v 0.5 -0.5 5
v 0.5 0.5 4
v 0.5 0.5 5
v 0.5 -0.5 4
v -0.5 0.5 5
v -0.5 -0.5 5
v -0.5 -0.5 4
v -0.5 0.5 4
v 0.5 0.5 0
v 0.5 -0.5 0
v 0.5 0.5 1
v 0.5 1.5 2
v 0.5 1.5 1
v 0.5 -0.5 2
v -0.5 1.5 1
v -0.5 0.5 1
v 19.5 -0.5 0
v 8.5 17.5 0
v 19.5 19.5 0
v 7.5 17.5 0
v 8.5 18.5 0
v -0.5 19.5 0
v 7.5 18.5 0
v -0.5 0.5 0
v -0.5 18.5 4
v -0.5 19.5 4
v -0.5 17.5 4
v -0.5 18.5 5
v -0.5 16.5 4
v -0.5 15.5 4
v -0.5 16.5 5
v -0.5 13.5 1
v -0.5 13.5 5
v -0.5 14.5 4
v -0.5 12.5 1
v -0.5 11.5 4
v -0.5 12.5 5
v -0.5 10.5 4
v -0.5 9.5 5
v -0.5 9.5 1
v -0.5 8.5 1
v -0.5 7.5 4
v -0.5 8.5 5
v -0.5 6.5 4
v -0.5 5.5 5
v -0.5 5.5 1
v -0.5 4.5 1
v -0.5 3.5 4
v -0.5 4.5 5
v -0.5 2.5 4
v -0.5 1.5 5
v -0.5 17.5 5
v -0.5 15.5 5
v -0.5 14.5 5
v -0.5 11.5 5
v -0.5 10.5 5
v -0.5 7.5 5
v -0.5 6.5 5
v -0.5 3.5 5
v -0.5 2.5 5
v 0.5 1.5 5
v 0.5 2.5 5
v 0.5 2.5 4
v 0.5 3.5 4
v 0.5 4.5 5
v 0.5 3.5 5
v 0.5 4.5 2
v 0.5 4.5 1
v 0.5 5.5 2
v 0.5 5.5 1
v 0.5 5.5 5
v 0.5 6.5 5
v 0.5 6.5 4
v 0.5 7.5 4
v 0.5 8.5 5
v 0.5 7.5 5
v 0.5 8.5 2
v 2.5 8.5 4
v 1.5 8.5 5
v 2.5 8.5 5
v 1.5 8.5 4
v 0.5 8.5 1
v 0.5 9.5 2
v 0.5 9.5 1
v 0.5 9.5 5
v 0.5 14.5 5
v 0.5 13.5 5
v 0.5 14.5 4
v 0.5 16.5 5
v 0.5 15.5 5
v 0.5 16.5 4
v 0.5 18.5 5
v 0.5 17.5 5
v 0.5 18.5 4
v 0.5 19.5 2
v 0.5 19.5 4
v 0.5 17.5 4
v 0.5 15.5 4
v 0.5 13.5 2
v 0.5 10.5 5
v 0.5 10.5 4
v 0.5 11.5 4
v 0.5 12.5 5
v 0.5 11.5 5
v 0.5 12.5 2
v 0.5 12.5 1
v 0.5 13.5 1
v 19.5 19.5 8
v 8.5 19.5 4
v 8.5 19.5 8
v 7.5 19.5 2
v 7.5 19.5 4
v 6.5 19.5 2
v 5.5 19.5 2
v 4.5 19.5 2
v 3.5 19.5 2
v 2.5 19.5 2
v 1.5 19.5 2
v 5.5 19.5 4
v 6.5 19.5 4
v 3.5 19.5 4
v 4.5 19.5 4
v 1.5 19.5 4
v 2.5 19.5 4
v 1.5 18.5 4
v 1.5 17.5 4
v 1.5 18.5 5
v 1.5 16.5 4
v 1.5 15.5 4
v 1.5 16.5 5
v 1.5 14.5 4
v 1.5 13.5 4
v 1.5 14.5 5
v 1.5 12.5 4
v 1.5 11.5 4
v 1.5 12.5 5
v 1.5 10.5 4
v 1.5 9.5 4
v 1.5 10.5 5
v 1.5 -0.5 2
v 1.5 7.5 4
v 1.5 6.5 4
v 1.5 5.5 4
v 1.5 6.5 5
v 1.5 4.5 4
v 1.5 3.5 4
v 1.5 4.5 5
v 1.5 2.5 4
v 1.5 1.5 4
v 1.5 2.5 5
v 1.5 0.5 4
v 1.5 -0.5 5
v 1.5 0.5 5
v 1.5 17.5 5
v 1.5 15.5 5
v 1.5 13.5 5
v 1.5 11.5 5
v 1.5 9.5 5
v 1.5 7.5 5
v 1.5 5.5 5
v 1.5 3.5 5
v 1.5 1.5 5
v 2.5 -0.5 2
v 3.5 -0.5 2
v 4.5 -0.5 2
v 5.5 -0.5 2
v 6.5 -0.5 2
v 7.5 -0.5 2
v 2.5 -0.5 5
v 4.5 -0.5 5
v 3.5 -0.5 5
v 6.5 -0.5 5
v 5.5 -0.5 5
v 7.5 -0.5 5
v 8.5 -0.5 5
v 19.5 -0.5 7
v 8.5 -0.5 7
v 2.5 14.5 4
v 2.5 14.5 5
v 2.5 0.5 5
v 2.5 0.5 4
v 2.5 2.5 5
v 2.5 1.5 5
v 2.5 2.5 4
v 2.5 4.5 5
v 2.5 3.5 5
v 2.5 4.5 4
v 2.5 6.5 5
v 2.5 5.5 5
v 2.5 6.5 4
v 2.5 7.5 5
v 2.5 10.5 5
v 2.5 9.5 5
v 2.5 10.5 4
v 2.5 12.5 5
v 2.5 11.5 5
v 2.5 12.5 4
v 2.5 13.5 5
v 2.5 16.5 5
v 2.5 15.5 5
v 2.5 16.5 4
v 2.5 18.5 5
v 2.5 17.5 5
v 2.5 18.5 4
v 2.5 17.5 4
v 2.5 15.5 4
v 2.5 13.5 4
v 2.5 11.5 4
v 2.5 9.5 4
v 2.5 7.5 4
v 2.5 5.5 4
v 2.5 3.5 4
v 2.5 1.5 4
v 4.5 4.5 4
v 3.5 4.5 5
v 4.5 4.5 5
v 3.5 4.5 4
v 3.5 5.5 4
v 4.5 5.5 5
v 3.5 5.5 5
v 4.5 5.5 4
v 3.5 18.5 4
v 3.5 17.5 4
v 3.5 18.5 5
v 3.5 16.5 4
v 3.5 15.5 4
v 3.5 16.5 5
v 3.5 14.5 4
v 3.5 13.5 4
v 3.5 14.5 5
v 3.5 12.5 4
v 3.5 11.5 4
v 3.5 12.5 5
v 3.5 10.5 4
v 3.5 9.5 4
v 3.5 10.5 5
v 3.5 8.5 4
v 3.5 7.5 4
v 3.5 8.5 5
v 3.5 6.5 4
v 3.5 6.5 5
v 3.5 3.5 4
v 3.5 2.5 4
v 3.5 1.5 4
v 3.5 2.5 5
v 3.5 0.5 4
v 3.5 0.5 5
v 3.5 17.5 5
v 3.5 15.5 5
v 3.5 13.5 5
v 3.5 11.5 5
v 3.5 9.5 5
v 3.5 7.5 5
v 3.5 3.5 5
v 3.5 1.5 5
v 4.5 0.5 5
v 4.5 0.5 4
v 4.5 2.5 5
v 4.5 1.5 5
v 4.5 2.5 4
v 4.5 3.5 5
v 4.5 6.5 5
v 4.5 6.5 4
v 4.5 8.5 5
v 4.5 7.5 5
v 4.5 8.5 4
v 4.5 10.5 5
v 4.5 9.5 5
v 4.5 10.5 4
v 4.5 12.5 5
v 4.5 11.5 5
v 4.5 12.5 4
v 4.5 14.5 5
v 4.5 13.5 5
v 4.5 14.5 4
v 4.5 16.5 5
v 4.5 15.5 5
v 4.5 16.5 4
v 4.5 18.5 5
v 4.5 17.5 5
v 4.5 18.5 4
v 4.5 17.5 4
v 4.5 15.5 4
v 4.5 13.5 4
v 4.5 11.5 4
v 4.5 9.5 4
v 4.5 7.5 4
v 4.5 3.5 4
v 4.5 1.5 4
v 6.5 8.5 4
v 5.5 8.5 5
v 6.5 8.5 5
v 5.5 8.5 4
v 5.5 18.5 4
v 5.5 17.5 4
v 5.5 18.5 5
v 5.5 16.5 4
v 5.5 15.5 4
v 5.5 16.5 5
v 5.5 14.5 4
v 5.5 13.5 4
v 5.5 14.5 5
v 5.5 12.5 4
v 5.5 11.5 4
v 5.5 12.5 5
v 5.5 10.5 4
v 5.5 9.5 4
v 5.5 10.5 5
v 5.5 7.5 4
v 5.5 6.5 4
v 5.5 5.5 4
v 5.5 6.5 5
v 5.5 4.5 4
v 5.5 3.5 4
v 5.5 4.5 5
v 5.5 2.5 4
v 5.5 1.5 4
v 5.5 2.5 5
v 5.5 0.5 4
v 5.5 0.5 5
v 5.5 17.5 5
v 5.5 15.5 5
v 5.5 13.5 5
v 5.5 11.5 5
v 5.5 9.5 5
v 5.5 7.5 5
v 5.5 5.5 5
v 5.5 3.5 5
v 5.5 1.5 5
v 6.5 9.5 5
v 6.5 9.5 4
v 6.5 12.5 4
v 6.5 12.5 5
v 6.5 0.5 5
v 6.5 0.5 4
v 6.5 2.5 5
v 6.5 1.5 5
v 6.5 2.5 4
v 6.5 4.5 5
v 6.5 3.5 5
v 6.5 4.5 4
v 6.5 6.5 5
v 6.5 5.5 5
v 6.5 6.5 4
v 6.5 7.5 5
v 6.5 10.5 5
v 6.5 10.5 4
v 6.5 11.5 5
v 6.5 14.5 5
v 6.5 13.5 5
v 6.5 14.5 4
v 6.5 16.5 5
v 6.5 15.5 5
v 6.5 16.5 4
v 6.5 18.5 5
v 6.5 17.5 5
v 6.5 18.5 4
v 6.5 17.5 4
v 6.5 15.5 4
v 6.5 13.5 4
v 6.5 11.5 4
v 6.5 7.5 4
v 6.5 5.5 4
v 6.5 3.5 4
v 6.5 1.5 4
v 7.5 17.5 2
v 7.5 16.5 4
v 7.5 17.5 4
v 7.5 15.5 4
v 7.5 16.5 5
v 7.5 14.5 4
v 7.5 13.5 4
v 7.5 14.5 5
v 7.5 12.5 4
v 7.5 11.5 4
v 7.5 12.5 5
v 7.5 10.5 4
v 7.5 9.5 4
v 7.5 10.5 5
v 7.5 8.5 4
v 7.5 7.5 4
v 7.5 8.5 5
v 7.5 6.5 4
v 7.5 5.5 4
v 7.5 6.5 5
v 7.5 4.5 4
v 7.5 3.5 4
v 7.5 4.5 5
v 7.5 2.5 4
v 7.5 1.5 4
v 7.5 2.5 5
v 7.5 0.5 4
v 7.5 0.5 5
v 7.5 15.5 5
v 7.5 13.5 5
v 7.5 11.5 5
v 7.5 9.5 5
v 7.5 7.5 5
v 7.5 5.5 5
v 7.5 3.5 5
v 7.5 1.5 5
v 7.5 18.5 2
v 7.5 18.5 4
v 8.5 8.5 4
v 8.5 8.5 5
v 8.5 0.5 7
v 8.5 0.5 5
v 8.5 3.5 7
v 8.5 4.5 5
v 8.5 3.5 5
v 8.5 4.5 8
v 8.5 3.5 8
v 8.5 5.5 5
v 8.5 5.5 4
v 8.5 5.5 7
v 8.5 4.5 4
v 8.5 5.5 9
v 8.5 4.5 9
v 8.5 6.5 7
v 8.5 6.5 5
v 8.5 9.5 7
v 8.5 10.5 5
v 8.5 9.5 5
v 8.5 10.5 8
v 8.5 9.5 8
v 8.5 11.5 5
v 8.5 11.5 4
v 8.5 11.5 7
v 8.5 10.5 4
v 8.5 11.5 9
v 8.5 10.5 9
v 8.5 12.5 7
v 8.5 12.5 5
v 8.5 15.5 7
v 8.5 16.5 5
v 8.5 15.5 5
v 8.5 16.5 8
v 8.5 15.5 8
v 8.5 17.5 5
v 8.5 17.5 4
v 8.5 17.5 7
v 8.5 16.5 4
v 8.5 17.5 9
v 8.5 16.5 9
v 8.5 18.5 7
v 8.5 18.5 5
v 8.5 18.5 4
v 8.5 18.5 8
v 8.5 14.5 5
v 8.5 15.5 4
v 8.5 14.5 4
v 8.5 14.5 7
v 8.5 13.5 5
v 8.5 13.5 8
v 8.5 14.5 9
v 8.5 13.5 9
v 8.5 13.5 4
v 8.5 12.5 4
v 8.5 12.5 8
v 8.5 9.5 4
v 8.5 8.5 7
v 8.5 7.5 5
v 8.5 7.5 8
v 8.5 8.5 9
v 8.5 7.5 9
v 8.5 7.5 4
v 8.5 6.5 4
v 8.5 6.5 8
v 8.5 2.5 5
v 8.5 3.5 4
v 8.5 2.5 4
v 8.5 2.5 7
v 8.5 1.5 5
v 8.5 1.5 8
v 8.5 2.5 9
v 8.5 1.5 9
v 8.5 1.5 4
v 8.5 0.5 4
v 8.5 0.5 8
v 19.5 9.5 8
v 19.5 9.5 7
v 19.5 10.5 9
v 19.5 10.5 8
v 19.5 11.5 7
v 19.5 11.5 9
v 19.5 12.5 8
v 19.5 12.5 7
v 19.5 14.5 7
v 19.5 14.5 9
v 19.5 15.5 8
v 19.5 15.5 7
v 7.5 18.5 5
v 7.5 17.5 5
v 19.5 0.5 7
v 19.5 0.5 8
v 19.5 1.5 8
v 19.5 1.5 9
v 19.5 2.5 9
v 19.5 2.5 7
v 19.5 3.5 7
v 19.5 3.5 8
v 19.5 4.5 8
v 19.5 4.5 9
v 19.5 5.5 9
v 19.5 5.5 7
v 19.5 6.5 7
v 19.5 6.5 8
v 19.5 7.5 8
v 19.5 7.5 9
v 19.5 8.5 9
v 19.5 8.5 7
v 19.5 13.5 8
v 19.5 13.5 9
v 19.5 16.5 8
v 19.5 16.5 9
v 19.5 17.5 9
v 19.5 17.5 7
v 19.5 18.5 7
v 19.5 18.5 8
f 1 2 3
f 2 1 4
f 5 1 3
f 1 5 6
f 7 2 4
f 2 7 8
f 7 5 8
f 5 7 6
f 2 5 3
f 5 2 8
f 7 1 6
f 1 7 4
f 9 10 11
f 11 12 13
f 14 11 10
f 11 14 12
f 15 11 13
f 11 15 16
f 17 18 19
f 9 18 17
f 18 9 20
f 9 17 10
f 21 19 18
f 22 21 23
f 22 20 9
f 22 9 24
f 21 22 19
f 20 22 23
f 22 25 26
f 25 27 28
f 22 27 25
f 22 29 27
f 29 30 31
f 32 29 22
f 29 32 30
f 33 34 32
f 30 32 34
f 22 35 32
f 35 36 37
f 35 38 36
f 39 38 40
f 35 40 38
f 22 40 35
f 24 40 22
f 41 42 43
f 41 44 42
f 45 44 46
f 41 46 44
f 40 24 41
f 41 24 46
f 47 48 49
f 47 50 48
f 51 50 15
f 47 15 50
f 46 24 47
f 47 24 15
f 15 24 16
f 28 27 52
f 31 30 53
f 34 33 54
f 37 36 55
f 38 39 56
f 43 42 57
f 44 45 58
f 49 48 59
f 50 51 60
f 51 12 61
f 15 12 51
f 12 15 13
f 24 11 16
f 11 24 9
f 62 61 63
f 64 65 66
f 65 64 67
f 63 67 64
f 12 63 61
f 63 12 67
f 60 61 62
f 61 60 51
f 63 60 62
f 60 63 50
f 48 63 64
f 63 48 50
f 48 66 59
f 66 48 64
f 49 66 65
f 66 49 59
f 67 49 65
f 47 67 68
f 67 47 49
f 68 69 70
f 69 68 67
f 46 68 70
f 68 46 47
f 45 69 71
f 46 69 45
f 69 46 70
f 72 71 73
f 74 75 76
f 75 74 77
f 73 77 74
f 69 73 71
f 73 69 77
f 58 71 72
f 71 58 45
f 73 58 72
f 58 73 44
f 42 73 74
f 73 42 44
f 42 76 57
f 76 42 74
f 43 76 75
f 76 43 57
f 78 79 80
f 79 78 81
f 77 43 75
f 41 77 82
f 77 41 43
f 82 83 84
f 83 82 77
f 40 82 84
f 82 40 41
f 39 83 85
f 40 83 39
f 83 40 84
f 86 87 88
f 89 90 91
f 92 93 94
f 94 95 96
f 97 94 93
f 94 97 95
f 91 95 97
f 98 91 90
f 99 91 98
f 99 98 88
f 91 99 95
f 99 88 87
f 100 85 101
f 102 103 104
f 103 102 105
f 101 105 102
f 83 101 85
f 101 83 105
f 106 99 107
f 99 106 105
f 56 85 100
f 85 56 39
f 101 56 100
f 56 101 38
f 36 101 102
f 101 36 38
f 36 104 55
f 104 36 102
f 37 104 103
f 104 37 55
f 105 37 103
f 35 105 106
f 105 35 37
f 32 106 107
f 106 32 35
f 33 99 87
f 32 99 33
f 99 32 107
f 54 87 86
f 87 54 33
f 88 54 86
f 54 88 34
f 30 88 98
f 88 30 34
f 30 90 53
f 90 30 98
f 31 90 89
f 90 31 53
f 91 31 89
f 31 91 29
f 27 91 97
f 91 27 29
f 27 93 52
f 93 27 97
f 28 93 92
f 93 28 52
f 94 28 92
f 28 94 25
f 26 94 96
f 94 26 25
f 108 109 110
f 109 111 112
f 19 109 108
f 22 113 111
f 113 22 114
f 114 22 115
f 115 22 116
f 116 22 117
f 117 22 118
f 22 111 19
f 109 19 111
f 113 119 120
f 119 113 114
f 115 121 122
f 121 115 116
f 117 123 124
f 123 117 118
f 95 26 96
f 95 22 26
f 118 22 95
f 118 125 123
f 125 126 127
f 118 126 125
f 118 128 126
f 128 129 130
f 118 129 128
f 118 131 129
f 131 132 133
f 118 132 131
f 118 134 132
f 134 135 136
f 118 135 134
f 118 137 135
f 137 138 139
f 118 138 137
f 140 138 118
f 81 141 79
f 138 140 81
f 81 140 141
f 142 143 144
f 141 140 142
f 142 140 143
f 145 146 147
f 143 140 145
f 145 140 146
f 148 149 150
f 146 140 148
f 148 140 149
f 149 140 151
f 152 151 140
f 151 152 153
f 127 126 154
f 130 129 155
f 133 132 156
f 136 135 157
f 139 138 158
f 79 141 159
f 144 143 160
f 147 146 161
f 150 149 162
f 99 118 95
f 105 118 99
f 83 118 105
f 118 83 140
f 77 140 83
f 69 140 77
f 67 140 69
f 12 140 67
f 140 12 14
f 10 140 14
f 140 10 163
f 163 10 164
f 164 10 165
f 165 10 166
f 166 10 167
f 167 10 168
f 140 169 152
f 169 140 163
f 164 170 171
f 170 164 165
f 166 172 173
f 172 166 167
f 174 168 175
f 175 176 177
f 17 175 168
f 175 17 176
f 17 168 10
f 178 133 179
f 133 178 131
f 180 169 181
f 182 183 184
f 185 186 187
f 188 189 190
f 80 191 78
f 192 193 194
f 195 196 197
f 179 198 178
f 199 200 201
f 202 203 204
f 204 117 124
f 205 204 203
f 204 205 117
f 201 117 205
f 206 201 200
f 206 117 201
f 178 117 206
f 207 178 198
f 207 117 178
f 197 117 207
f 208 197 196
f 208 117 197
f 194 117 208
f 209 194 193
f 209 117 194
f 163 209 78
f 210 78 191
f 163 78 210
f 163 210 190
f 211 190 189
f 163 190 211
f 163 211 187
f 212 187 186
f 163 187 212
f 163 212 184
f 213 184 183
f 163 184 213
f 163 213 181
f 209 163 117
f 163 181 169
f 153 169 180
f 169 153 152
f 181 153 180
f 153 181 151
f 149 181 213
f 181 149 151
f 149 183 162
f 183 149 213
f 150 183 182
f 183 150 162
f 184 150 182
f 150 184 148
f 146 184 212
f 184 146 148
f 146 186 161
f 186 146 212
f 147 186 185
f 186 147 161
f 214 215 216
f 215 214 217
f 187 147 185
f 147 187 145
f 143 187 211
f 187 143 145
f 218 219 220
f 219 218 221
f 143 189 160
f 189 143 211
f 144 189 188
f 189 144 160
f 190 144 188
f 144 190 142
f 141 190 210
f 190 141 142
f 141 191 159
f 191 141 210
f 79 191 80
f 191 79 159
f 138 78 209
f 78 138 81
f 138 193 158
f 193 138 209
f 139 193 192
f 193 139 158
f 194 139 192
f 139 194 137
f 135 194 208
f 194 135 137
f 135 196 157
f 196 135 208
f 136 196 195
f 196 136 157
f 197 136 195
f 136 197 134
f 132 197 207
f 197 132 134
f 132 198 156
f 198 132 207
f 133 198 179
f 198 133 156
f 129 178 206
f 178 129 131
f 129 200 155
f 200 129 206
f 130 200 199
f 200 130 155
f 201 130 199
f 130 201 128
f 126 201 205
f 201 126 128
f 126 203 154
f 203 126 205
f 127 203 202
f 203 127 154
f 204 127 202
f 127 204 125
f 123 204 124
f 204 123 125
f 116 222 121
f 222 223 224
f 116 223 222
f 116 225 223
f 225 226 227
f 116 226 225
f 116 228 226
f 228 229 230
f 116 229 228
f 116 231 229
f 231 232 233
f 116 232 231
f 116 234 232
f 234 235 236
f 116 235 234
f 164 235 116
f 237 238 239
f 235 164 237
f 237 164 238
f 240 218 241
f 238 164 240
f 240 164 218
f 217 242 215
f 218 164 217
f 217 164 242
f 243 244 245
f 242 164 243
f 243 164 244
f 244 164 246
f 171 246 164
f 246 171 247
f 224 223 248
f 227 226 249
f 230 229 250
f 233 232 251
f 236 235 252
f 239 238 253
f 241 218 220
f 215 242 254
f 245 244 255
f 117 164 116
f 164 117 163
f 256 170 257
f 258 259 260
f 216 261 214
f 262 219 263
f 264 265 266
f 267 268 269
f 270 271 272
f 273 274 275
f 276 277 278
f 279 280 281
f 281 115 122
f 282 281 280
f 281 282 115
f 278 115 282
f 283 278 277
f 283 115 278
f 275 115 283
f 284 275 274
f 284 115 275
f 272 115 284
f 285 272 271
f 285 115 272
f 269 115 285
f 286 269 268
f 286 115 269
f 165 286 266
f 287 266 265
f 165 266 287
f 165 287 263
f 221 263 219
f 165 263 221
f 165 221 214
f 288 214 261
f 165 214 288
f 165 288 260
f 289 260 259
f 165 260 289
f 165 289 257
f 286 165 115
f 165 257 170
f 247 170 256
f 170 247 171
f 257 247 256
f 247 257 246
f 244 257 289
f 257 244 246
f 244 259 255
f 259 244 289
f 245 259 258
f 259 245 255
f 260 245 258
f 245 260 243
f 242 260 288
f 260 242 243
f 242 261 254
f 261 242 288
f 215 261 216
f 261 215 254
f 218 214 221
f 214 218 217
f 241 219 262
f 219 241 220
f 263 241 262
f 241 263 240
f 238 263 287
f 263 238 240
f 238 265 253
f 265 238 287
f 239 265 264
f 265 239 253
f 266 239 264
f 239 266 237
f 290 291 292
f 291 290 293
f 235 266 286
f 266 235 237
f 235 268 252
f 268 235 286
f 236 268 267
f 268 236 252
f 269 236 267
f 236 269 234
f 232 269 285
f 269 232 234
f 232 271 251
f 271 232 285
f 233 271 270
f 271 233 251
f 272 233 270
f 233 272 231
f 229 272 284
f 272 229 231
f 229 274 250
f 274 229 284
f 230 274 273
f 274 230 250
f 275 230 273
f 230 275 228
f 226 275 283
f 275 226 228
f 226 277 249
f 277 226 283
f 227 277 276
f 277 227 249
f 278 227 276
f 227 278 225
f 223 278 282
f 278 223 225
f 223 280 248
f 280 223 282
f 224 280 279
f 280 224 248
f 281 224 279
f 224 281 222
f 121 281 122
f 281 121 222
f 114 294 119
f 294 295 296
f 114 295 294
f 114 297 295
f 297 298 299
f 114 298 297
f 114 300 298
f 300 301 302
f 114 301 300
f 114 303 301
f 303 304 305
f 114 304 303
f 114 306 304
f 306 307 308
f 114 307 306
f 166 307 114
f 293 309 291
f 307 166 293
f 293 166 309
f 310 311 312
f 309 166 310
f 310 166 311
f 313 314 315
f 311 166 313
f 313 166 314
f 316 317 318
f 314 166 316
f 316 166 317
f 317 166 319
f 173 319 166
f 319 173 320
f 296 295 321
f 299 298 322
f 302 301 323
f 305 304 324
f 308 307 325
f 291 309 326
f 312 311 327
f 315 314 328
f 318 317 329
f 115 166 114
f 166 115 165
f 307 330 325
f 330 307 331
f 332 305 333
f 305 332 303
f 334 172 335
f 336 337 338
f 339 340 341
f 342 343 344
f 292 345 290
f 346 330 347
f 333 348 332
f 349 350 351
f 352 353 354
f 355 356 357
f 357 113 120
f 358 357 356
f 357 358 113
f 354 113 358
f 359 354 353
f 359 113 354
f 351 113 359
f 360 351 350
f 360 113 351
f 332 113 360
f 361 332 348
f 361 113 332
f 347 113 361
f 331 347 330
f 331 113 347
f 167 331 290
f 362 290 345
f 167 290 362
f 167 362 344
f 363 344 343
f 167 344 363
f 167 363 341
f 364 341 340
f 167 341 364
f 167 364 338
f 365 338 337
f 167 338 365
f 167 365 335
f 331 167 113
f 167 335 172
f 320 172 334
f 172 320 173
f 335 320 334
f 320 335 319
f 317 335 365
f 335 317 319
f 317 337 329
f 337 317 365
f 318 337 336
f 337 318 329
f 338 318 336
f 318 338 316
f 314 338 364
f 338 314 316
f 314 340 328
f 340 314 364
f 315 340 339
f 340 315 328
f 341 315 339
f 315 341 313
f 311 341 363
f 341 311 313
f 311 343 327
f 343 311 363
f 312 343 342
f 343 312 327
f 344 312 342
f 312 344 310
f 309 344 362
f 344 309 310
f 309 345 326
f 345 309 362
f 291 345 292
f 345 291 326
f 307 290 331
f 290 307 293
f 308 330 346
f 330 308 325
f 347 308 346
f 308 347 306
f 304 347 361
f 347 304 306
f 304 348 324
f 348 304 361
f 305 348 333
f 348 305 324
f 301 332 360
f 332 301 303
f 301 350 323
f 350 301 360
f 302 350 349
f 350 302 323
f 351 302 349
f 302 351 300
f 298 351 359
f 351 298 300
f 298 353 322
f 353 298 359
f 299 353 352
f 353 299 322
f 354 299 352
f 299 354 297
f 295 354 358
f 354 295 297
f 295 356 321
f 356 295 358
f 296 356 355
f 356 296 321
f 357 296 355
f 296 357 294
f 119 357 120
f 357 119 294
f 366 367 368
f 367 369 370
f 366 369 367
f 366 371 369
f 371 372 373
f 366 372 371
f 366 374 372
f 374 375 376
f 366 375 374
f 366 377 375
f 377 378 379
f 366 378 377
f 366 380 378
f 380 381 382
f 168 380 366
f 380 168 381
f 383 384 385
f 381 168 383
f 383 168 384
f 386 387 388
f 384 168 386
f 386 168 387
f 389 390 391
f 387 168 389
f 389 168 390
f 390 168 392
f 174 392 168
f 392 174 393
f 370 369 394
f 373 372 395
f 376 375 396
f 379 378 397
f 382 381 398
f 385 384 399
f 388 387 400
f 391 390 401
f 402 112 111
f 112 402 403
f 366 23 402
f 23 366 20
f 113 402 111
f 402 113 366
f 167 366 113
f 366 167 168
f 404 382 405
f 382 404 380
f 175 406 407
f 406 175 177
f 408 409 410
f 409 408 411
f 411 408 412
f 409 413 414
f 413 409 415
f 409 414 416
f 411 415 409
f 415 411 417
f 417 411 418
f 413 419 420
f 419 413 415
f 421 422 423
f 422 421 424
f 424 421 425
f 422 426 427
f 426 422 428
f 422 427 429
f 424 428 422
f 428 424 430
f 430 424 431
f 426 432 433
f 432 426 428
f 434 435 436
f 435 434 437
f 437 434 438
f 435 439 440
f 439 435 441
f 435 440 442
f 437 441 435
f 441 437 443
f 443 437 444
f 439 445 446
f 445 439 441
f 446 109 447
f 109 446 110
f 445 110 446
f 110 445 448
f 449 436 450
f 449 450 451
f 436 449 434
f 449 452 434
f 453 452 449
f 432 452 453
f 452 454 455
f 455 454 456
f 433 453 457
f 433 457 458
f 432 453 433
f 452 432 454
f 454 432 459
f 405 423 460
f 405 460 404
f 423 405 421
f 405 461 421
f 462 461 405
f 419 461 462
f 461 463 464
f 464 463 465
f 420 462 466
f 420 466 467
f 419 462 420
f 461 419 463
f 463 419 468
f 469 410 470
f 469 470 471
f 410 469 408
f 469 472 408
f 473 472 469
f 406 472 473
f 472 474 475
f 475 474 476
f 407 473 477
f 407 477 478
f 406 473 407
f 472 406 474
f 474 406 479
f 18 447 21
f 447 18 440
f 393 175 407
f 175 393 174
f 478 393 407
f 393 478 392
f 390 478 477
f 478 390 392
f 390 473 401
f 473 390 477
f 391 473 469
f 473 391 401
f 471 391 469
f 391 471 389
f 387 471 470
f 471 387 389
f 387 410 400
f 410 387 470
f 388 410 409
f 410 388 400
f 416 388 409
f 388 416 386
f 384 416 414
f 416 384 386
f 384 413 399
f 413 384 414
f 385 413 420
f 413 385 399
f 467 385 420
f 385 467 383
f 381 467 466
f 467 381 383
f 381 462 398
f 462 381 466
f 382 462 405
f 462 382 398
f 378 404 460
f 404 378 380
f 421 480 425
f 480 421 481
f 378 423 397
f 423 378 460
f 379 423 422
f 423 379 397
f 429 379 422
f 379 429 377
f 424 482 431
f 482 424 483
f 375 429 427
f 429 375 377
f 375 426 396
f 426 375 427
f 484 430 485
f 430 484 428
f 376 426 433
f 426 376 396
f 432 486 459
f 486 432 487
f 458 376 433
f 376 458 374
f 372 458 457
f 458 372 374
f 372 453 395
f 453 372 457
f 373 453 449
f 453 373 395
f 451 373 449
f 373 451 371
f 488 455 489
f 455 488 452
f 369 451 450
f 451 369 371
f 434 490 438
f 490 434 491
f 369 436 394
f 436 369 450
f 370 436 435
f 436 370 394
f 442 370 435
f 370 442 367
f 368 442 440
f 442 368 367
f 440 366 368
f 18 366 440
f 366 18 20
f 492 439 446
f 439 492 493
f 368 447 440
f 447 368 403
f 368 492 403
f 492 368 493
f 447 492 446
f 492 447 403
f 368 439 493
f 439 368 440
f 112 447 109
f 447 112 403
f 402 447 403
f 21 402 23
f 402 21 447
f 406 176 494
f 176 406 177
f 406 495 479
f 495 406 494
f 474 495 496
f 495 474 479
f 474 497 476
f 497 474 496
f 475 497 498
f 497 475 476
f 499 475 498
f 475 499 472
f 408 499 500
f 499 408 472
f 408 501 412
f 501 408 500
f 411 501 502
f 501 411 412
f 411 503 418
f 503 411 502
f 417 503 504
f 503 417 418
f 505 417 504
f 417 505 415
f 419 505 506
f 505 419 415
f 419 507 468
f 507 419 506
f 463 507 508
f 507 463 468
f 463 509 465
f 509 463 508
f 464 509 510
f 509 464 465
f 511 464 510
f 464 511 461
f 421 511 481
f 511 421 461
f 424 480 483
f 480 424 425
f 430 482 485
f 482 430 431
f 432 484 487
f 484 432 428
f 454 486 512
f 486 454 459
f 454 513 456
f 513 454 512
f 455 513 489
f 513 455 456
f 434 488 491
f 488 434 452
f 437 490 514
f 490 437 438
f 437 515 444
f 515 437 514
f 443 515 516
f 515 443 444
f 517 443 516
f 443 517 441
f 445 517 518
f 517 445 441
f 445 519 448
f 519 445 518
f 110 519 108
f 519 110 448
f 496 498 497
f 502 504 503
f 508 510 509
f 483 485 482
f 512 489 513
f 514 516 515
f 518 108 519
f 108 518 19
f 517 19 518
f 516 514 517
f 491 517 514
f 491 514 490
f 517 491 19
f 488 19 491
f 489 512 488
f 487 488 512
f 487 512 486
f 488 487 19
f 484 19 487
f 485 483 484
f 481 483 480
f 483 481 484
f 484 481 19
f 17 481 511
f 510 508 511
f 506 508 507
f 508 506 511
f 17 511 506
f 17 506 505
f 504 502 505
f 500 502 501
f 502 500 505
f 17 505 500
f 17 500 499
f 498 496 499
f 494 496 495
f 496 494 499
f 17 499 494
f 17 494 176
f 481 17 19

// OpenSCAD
union() {
    translate([0, 0, 4.5]) color([1, 0, 0]) cube([1, 1, 1], center=true);
    translate([0, 1, 0.5]) cube([1, 1, 1], center=true);
    translate([0, 2, 2.5]) cube([1, 1, 5], center=true);
    translate([0, 3, 2.0]) cube([1, 1, 4], center=true);
    translate([0, 4, 2.5]) cube([1, 1, 5], center=true);
    translate([0, 5, 0.5]) cube([1, 1, 1], center=true);
    translate([0, 6, 2.5]) cube([1, 1, 5], center=true);
    translate([0, 7, 2.0]) cube([1, 1, 4], center=true);
    translate([0, 8, 2.5]) cube([1, 1, 5], center=true);
    translate([0, 9, 0.5]) cube([1, 1, 1], center=true);
    translate([0, 10, 2.5]) cube([1, 1, 5], center=true);
    translate([0, 11, 2.0]) cube([1, 1, 4], center=true);
    translate([0, 12, 2.5]) cube([1, 1, 5], center=true);
    translate([0, 13, 0.5]) cube([1, 1, 1], center=true);
    translate([0, 14, 2.5]) cube([1, 1, 5], center=true);
    translate([0, 15, 2.0]) cube([1, 1, 4], center=true);
    translate([0, 16, 2.5]) cube([1, 1, 5], center=true);
    translate([0, 17, 2.0]) cube([1, 1, 4], center=true);
    translate([0, 18, 2.5]) cube([1, 1, 5], center=true);
    translate([0, 19, 2.0]) cube([1, 1, 4], center=true);
    translate([1, 0, 1.0]) cube([1, 1, 2], center=true);
    translate([1, 1, 1.0]) cube([1, 1, 2], center=true);
    translate([1, 2, 1.0]) cube([1, 1, 2], center=true);
    translate([1, 3, 1.0]) cube([1, 1, 2], center=true);
    translate([1, 4, 1.0]) cube([1, 1, 2], center=true);
    translate([1, 5, 1.0]) cube([1, 1, 2], center=true);
    translate([1, 6, 1.0]) cube([1, 1, 2], center=true);
    translate([1, 7, 1.0]) cube([1, 1, 2], center=true);
    translate([1, 8, 1.0]) cube([1, 1, 2], center=true);
    translate([1, 9, 1.0]) cube([1, 1, 2], center=true);
    translate([1, 10, 1.0]) cube([1, 1, 2], center=true);
    translate([1, 11, 1.0]) cube([1, 1, 2], center=true);
    translate([1, 12, 1.0]) cube([1, 1, 2], center=true);
    translate([1, 13, 1.0]) cube([1, 1, 2], center=true);
    translate([1, 14, 1.0]) cube([1, 1, 2], center=true);
    translate([1, 15, 1.0]) cube([1, 1, 2], center=true);
    translate([1, 16, 1.0]) cube([1, 1, 2], center=true);
    translate([1, 17, 1.0]) cube([1, 1, 2], center=true);
    translate([1, 18, 1.0]) cube([1, 1, 2], center=true);
    translate([1, 19, 1.0]) cube([1, 1, 2], center=true);
    translate([2, 0, 2.5]) cube([1, 1, 5], center=true);
    translate([2, 1, 2.0]) cube([1, 1, 4], center=true);
    translate([2, 2, 2.5]) cube([1, 1, 5], center=true);
    translate([2, 3, 2.0]) cube([1, 1, 4], center=true);
    translate([2, 4, 2.5]) cube([1, 1, 5], center=true);
    translate([2, 5, 2.0]) cube([1, 1, 4], center=true);
    translate([2, 6, 2.5]) cube([1, 1, 5], center=true);
    translate([2, 7, 2.0]) cube([1, 1, 4], center=true);
    translate([2, 8, 2.5]) cube([1, 1, 5], center=true);
    translate([2, 9, 2.0]) cube([1, 1, 4], center=true);
    translate([2, 10, 2.5]) cube([1, 1, 5], center=true);
    translate([2, 11, 2.0]) cube([1, 1, 4], center=true);
    translate([2, 12, 2.5]) cube([1, 1, 5], center=true);
    translate([2, 13, 2.0]) cube([1, 1, 4], center=true);
    translate([2, 14, 2.5]) cube([1, 1, 5], center=true);
    translate([2, 15, 2.0]) cube([1, 1, 4], center=true);
    translate([2, 16, 2.5]) cube([1, 1, 5], center=true);
    translate([2, 17, 2.0]) cube([1, 1, 4], center=true);
    translate([2, 18, 2.5]) cube([1, 1, 5], center=true);
    translate([2, 19, 2.0]) cube([1, 1, 4], center=true);
    translate([3, 0, 1.0]) cube([1, 1, 2], center=true);
    translate([3, 1, 1.0]) cube([1, 1, 2], center=true);
    translate([3, 2, 1.0]) cube([1, 1, 2], center=true);
    translate([3, 3, 1.0]) cube([1, 1, 2], center=true);
    translate([3, 4, 1.0]) cube([1, 1, 2], center=true);
    translate([3, 5, 1.0]) cube([1, 1, 2], center=true);
    translate([3, 6, 1.0]) cube([1, 1, 2], center=true);
    translate([3, 7, 1.0]) cube([1, 1, 2], center=true);
    translate([3, 8, 1.0]) cube([1, 1, 2], center=true);
    translate([3, 9, 1.0]) cube([1, 1, 2], center=true);
    translate([3, 10, 1.0]) cube([1, 1, 2], center=true);
    translate([3, 11, 1.0]) cube([1, 1, 2], center=true);
    translate([3, 12, 1.0]) cube([1, 1, 2], center=true);
    translate([3, 13, 1.0]) cube([1, 1, 2], center=true);
    translate([3, 14, 1.0]) cube([1, 1, 2], center=true);
    translate([3, 15, 1.0]) cube([1, 1, 2], center=true);
    translate([3, 16, 1.0]) cube([1, 1, 2], center=true);
    translate([3, 17, 1.0]) cube([1, 1, 2], center=true);
    translate([3, 18, 1.0]) cube([1, 1, 2], center=true);
    translate([3, 19, 1.0]) cube([1, 1, 2], center=true);
    translate([4, 0, 2.5]) cube([1, 1, 5], center=true);
    translate([4, 1, 2.0]) cube([1, 1, 4], center=true);
    translate([4, 2, 2.5]) cube([1, 1, 5], center=true);
    translate([4, 3, 2.0]) cube([1, 1, 4], center=true);
    translate([4, 4, 2.5]) cube([1, 1, 5], center=true);
    translate([4, 5, 2.0]) cube([1, 1, 4], center=true);
    translate([4, 6, 2.5]) cube([1, 1, 5], center=true);
    translate([4, 7, 2.0]) cube([1, 1, 4], center=true);
    translate([4, 8, 2.5]) cube([1, 1, 5], center=true);
    translate([4, 9, 2.0]) cube([1, 1, 4], center=true);
    translate([4, 10, 2.5]) cube([1, 1, 5], center=true);
    translate([4, 11, 2.0]) cube([1, 1, 4], center=true);
    translate([4, 12, 2.5]) cube([1, 1, 5], center=true);
    translate([4, 13, 2.0]) cube([1, 1, 4], center=true);
    translate([4, 14, 2.5]) cube([1, 1, 5], center=true);
    translate([4, 15, 2.0]) cube([1, 1, 4], center=true);
    translate([4, 16, 2.5]) cube([1, 1, 5], center=true);
    translate([4, 17, 2.0]) cube([1, 1, 4], center=true);
    translate([4, 18, 2.5]) cube([1, 1, 5], center=true);
    translate([4, 19, 2.0]) cube([1, 1, 4], center=true);
    translate([5, 0, 1.0]) cube([1, 1, 2], center=true);
    translate([5, 1, 1.0]) cube([1, 1, 2], center=true);
    translate([5, 2, 1.0]) cube([1, 1, 2], center=true);
    translate([5, 3, 1.0]) cube([1, 1, 2], center=true);
    translate([5, 4, 1.0]) cube([1, 1, 2], center=true);
    translate([5, 5, 1.0]) cube([1, 1, 2], center=true);
    translate([5, 6, 1.0]) cube([1, 1, 2], center=true);
    translate([5, 7, 1.0]) cube([1, 1, 2], center=true);
    translate([5, 8, 1.0]) cube([1, 1, 2], center=true);
    translate([5, 9, 1.0]) cube([1, 1, 2], center=true);
    translate([5, 10, 1.0]) cube([1, 1, 2], center=true);
    translate([5, 11, 1.0]) cube([1, 1, 2], center=true);
    translate([5, 12, 1.0]) cube([1, 1, 2], center=true);
    translate([5, 13, 1.0]) cube([1, 1, 2], center=true);
    translate([5, 14, 1.0]) cube([1, 1, 2], center=true);
    translate([5, 15, 1.0]) cube([1, 1, 2], center=true);
    translate([5, 16, 1.0]) cube([1, 1, 2], center=true);
    translate([5, 17, 1.0]) cube([1, 1, 2], center=true);
    translate([5, 18, 1.0]) cube([1, 1, 2], center=true);
    translate([5, 19, 1.0]) cube([1, 1, 2], center=true);
    translate([6, 0, 2.5]) cube([1, 1, 5], center=true);
    translate([6, 1, 2.0]) cube([1, 1, 4], center=true);
    translate([6, 2, 2.5]) cube([1, 1, 5], center=true);
    translate([6, 3, 2.0]) cube([1, 1, 4], center=true);
    translate([6, 4, 2.5]) cube([1, 1, 5], center=true);
    translate([6, 5, 2.0]) cube([1, 1, 4], center=true);
    translate([6, 6, 2.5]) cube([1, 1, 5], center=true);
    translate([6, 7, 2.0]) cube([1, 1, 4], center=true);
    translate([6, 8, 2.5]) cube([1, 1, 5], center=true);
    translate([6, 9, 2.0]) cube([1, 1, 4], center=true);
    translate([6, 10, 2.5]) cube([1, 1, 5], center=true);
    translate([6, 11, 2.0]) cube([1, 1, 4], center=true);
    translate([6, 12, 2.5]) cube([1, 1, 5], center=true);
    translate([6, 13, 2.0]) cube([1, 1, 4], center=true);
    translate([6, 14, 2.5]) cube([1, 1, 5], center=true);
    translate([6, 15, 2.0]) cube([1, 1, 4], center=true);
    translate([6, 16, 2.5]) cube([1, 1, 5], center=true);
    translate([6, 17, 2.0]) cube([1, 1, 4], center=true);
    translate([6, 18, 2.5]) cube([1, 1, 5], center=true);
    translate([6, 19, 2.0]) cube([1, 1, 4], center=true);
    translate([7, 0, 1.0]) cube([1, 1, 2], center=true);
    translate([7, 1, 1.0]) cube([1, 1, 2], center=true);
    translate([7, 2, 1.0]) cube([1, 1, 2], center=true);
    translate([7, 3, 1.0]) cube([1, 1, 2], center=true);
    translate([7, 4, 1.0]) cube([1, 1, 2], center=true);
    translate([7, 5, 1.0]) cube([1, 1, 2], center=true);
    translate([7, 6, 1.0]) cube([1, 1, 2], center=true);
    translate([7, 7, 1.0]) cube([1, 1, 2], center=true);
    translate([7, 8, 1.0]) cube([1, 1, 2], center=true);
    translate([7, 9, 1.0]) cube([1, 1, 2], center=true);
    translate([7, 10, 1.0]) cube([1, 1, 2], center=true);
    translate([7, 11, 1.0]) cube([1, 1, 2], center=true);
    translate([7, 12, 1.0]) cube([1, 1, 2], center=true);
    translate([7, 13, 1.0]) cube([1, 1, 2], center=true);
    translate([7, 14, 1.0]) cube([1, 1, 2], center=true);
    translate([7, 15, 1.0]) cube([1, 1, 2], center=true);
    translate([7, 16, 1.0]) cube([1, 1, 2], center=true);
    translate([7, 17, 1.0]) cube([1, 1, 2], center=true);
    translate([7, 18, 1.0]) cube([1, 1, 2], center=true);
    translate([7, 19, 1.0]) cube([1, 1, 2], center=true);
    translate([8, 0, 2.5]) cube([1, 1, 5], center=true);
    translate([8, 1, 2.0]) cube([1, 1, 4], center=true);
    translate([8, 2, 2.5]) cube([1, 1, 5], center=true);
    translate([8, 3, 2.0]) cube([1, 1, 4], center=true);
    translate([8, 4, 2.5]) cube([1, 1, 5], center=true);
    translate([8, 5, 2.0]) cube([1, 1, 4], center=true);
    translate([8, 6, 2.5]) cube([1, 1, 5], center=true);
    translate([8, 7, 2.0]) cube([1, 1, 4], center=true);
    translate([8, 8, 2.5]) cube([1, 1, 5], center=true);
    translate([8, 9, 2.0]) cube([1, 1, 4], center=true);
    translate([8, 10, 2.5]) cube([1, 1, 5], center=true);
    translate([8, 11, 2.0]) cube([1, 1, 4], center=true);
    translate([8, 12, 2.5]) cube([1, 1, 5], center=true);
    translate([8, 13, 2.0]) cube([1, 1, 4], center=true);
    translate([8, 14, 2.5]) cube([1, 1, 5], center=true);
    translate([8, 15, 2.0]) cube([1, 1, 4], center=true);
    translate([8, 16, 2.5]) cube([1, 1, 5], center=true);
    translate([8, 17, 2.0]) cube([1, 1, 4], center=true);
    translate([8, 18, 4.5]) color([0, 0, 1]) cube([1, 1, 1], center=true);
    translate([8, 19, 2.0]) cube([1, 1, 4], center=true);
    translate([9, 0, 3.5]) cube([1, 1, 7], center=true);
    translate([9, 1, 4.0]) cube([1, 1, 8], center=true);
    translate([9, 2, 4.5]) cube([1, 1, 9], center=true);
    translate([9, 3, 3.5]) cube([1, 1, 7], center=true);
    translate([9, 4, 4.0]) cube([1, 1, 8], center=true);
    translate([9, 5, 4.5]) cube([1, 1, 9], center=true);
    translate([9, 6, 3.5]) cube([1, 1, 7], center=true);
    translate([9, 7, 4.0]) cube([1, 1, 8], center=true);
    translate([9, 8, 4.5]) cube([1, 1, 9], center=true);
    translate([9, 9, 3.5]) cube([1, 1, 7], center=true);
    translate([9, 10, 4.0]) cube([1, 1, 8], center=true);
    translate([9, 11, 4.5]) cube([1, 1, 9], center=true);
    translate([9, 12, 3.5]) cube([1, 1, 7], center=true);
    translate([9, 13, 4.0]) cube([1, 1, 8], center=true);
    translate([9, 14, 4.5]) cube([1, 1, 9], center=true);
    translate([9, 15, 3.5]) cube([1, 1, 7], center=true);
    translate([9, 16, 4.0]) cube([1, 1, 8], center=true);
    translate([9, 17, 4.5]) cube([1, 1, 9], center=true);
    translate([9, 18, 3.5]) cube([1, 1, 7], center=true);
    translate([9, 19, 4.0]) cube([1, 1, 8], center=true);
    translate([10, 0, 3.5]) cube([1, 1, 7], center=true);
    translate([10, 1, 4.0]) cube([1, 1, 8], center=true);
    translate([10, 2, 4.5]) cube([1, 1, 9], center=true);
    translate([10, 3, 3.5]) cube([1, 1, 7], center=true);
    translate([10, 4, 4.0]) cube([1, 1, 8], center=true);
    translate([10, 5, 4.5]) cube([1, 1, 9], center=true);
    translate([10, 6, 3.5]) cube([1, 1, 7], center=true);
    translate([10, 7, 4.0]) cube([1, 1, 8], center=true);
    translate([10, 8, 4.5]) cube([1, 1, 9], center=true);
    translate([10, 9, 3.5]) cube([1, 1, 7], center=true);
    translate([10, 10, 4.0]) cube([1, 1, 8], center=true);
    translate([10, 11, 4.5]) cube([1, 1, 9], center=true);
    translate([10, 12, 3.5]) cube([1, 1, 7], center=true);
    translate([10, 13, 4.0]) cube([1, 1, 8], center=true);
    translate([10, 14, 4.5]) cube([1, 1, 9], center=true);
    translate([10, 15, 3.5]) cube([1, 1, 7], center=true);
    translate([10, 16, 4.0]) cube([1, 1, 8], center=true);
    translate([10, 17, 4.5]) cube([1, 1, 9], center=true);
    translate([10, 18, 3.5]) cube([1, 1, 7], center=true);
    translate([10, 19, 4.0]) cube([1, 1, 8], center=true);
    translate([11, 0, 3.5]) cube([1, 1, 7], center=true);
    translate([11, 1, 4.0]) cube([1, 1, 8], center=true);
    translate([11, 2, 4.5]) cube([1, 1, 9], center=true);
    translate([11, 3, 3.5]) cube([1, 1, 7], center=true);
    translate([11, 4, 4.0]) cube([1, 1, 8], center=true);
    translate([11, 5, 4.5]) cube([1, 1, 9], center=true);
    translate([11, 6, 3.5]) cube([1, 1, 7], center=true);
    translate([11, 7, 4.0]) cube([1, 1, 8], center=true);
    translate([11, 8, 4.5]) cube([1, 1, 9], center=true);
    translate([11, 9, 3.5]) cube([1, 1, 7], center=true);
    translate([11, 10, 4.0]) cube([1, 1, 8], center=true);
    translate([11, 11, 4.5]) cube([1, 1, 9], center=true);
    translate([11, 12, 3.5]) cube([1, 1, 7], center=true);
    translate([11, 13, 4.0]) cube([1, 1, 8], center=true);
    translate([11, 14, 4.5]) cube([1, 1, 9], center=true);
    translate([11, 15, 3.5]) cube([1, 1, 7], center=true);
    translate([11, 16, 4.0]) cube([1, 1, 8], center=true);
    translate([11, 17, 4.5]) cube([1, 1, 9], center=true);
    translate([11, 18, 3.5]) cube([1, 1, 7], center=true);
    translate([11, 19, 4.0]) cube([1, 1, 8], center=true);
    translate([12, 0, 3.5]) cube([1, 1, 7], center=true);
    translate([12, 1, 4.0]) cube([1, 1, 8], center=true);
    translate([12, 2, 4.5]) cube([1, 1, 9], center=true);
    translate([12, 3, 3.5]) cube([1, 1, 7], center=true);
    translate([12, 4, 4.0]) cube([1, 1, 8], center=true);
    translate([12, 5, 4.5]) cube([1, 1, 9], center=true);
    translate([12, 6, 3.5]) cube([1, 1, 7], center=true);
    translate([12, 7, 4.0]) cube([1, 1, 8], center=true);
    translate([12, 8, 4.5]) cube([1, 1, 9], center=true);
    translate([12, 9, 3.5]) cube([1, 1, 7], center=true);
    translate([12, 10, 4.0]) cube([1, 1, 8], center=true);
    translate([12, 11, 4.5]) cube([1, 1, 9], center=true);
    translate([12, 12, 3.5]) cube([1, 1, 7], center=true);
    translate([12, 13, 4.0]) cube([1, 1, 8], center=true);
    translate([12, 14, 4.5]) cube([1, 1, 9], center=true);
    translate([12, 15, 3.5]) cube([1, 1, 7], center=true);
    translate([12, 16, 4.0]) cube([1, 1, 8], center=true);
    translate([12, 17, 4.5]) cube([1, 1, 9], center=true);
    translate([12, 18, 3.5]) cube([1, 1, 7], center=true);
    translate([12, 19, 4.0]) cube([1, 1, 8], center=true);
    translate([13, 0, 3.5]) cube([1, 1, 7], center=true);
    translate([13, 1, 4.0]) cube([1, 1, 8], center=true);
    translate([13, 2, 4.5]) cube([1, 1, 9], center=true);
    translate([13, 3, 3.5]) cube([1, 1, 7], center=true);
    translate([13, 4, 4.0]) cube([1, 1, 8], center=true);
    translate([13, 5, 4.5]) cube([1, 1, 9], center=true);
    translate([13, 6, 3.5]) cube([1, 1, 7], center=true);
    translate([13, 7, 4.0]) cube([1, 1, 8], center=true);
    translate([13, 8, 4.5]) cube([1, 1, 9], center=true);
    translate([13, 9, 3.5]) cube([1, 1, 7], center=true);
    translate([13, 10, 4.0]) cube([1, 1, 8], center=true);
    translate([13, 11, 4.5]) cube([1, 1, 9], center=true);
    translate([13, 12, 3.5]) cube([1, 1, 7], center=true);
    translate([13, 13, 4.0]) cube([1, 1, 8], center=true);
    translate([13, 14, 4.5]) cube([1, 1, 9], center=true);
    translate([13, 15, 3.5]) cube([1, 1, 7], center=true);
    translate([13, 16, 4.0]) cube([1, 1, 8], center=true);
    translate([13, 17, 4.5]) cube([1, 1, 9], center=true);
    translate([13, 18, 3.5]) cube([1, 1, 7], center=true);
    translate([13, 19, 4.0]) cube([1, 1, 8], center=true);
    translate([14, 0, 3.5]) cube([1, 1, 7], center=true);
    translate([14, 1, 4.0]) cube([1, 1, 8], center=true);
    translate([14, 2, 4.5]) cube([1, 1, 9], center=true);
    translate([14, 3, 3.5]) cube([1, 1, 7], center=true);
    translate([14, 4, 4.0]) cube([1, 1, 8], center=true);
    translate([14, 5, 4.5]) cube([1, 1, 9], center=true);
    translate([14, 6, 3.5]) cube([1, 1, 7], center=true);
    translate([14, 7, 4.0]) cube([1, 1, 8], center=true);
    translate([14, 8, 4.5]) cube([1, 1, 9], center=true);
    translate([14, 9, 3.5]) cube([1, 1, 7], center=true);
    translate([14, 10, 4.0]) cube([1, 1, 8], center=true);
    translate([14, 11, 4.5]) cube([1, 1, 9], center=true);
    translate([14, 12, 3.5]) cube([1, 1, 7], center=true);
    translate([14, 13, 4.0]) cube([1, 1, 8], center=true);
    translate([14, 14, 4.5]) cube([1, 1, 9], center=true);
    translate([14, 15, 3.5]) cube([1, 1, 7], center=true);
    translate([14, 16, 4.0]) cube([1, 1, 8], center=true);
    translate([14, 17, 4.5]) cube([1, 1, 9], center=true);
    translate([14, 18, 3.5]) cube([1, 1, 7], center=true);
    translate([14, 19, 4.0]) cube([1, 1, 8], center=true);
    translate([15, 0, 3.5]) cube([1, 1, 7], center=true);
    translate([15, 1, 4.0]) cube([1, 1, 8], center=true);
    translate([15, 2, 4.5]) cube([1, 1, 9], center=true);
    translate([15, 3, 3.5]) cube([1, 1, 7], center=true);
    translate([15, 4, 4.0]) cube([1, 1, 8], center=true);
    translate([15, 5, 4.5]) cube([1, 1, 9], center=true);
    translate([15, 6, 3.5]) cube([1, 1, 7], center=true);
    translate([15, 7, 4.0]) cube([1, 1, 8], center=true);
    translate([15, 8, 4.5]) cube([1, 1, 9], center=true);
    translate([15, 9, 3.5]) cube([1, 1, 7], center=true);
    translate([15, 10, 4.0]) cube([1, 1, 8], center=true);
    translate([15, 11, 4.5]) cube([1, 1, 9], center=true);
    translate([15, 12, 3.5]) cube([1, 1, 7], center=true);
    translate([15, 13, 4.0]) cube([1, 1, 8], center=true);
    translate([15, 14, 4.5]) cube([1, 1, 9], center=true);
    translate([15, 15, 3.5]) cube([1, 1, 7], center=true);
    translate([15, 16, 4.0]) cube([1, 1, 8], center=true);
    translate([15, 17, 4.5]) cube([1, 1, 9], center=true);
    translate([15, 18, 3.5]) cube([1, 1, 7], center=true);
    translate([15, 19, 4.0]) cube([1, 1, 8], center=true);
    translate([16, 0, 3.5]) cube([1, 1, 7], center=true);
    translate([16, 1, 4.0]) cube([1, 1, 8], center=true);
    translate([16, 2, 4.5]) cube([1, 1, 9], center=true);
    translate([16, 3, 3.5]) cube([1, 1, 7], center=true);
    translate([16, 4, 4.0]) cube([1, 1, 8], center=true);
    translate([16, 5, 4.5]) cube([1, 1, 9], center=true);
    translate([16, 6, 3.5]) cube([1, 1, 7], center=true);
    translate([16, 7, 4.0]) cube([1, 1, 8], center=true);
    translate([16, 8, 4.5]) cube([1, 1, 9], center=true);
    translate([16, 9, 3.5]) cube([1, 1, 7], center=true);
    translate([16, 10, 4.0]) cube([1, 1, 8], center=true);
    translate([16, 11, 4.5]) cube([1, 1, 9], center=true);
    translate([16, 12, 3.5]) cube([1, 1, 7], center=true);
    translate([16, 13, 4.0]) cube([1, 1, 8], center=true);
    translate([16, 14, 4.5]) cube([1, 1, 9], center=true);
    translate([16, 15, 3.5]) cube([1, 1, 7], center=true);
    translate([16, 16, 4.0]) cube([1, 1, 8], center=true);
    translate([16, 17, 4.5]) cube([1, 1, 9], center=true);
    translate([16, 18, 3.5]) cube([1, 1, 7], center=true);
    translate([16, 19, 4.0]) cube([1, 1, 8], center=true);
    translate([17, 0, 3.5]) cube([1, 1, 7], center=true);
    translate([17, 1, 4.0]) cube([1, 1, 8], center=true);
    translate([17, 2, 4.5]) cube([1, 1, 9], center=true);
    translate([17, 3, 3.5]) cube([1, 1, 7], center=true);
    translate([17, 4, 4.0]) cube([1, 1, 8], center=true);
    translate([17, 5, 4.5]) cube([1, 1, 9], center=true);
    translate([17, 6, 3.5]) cube([1, 1, 7], center=true);
    translate([17, 7, 4.0]) cube([1, 1, 8], center=true);
    translate([17, 8, 4.5]) cube([1, 1, 9], center=true);
    translate([17, 9, 3.5]) cube([1, 1, 7], center=true);
    translate([17, 10, 4.0]) cube([1, 1, 8], center=true);
    translate([17, 11, 4.5]) cube([1, 1, 9], center=true);
    translate([17, 12, 3.5]) cube([1, 1, 7], center=true);
    translate([17, 13, 4.0]) cube([1, 1, 8], center=true);
    translate([17, 14, 4.5]) cube([1, 1, 9], center=true);
    translate([17, 15, 3.5]) cube([1, 1, 7], center=true);
    translate([17, 16, 4.0]) cube([1, 1, 8], center=true);
    translate([17, 17, 4.5]) cube([1, 1, 9], center=true);
    translate([17, 18, 3.5]) cube([1, 1, 7], center=true);
    translate([17, 19, 4.0]) cube([1, 1, 8], center=true);
    translate([18, 0, 3.5]) cube([1, 1, 7], center=true);
    translate([18, 1, 4.0]) cube([1, 1, 8], center=true);
    translate([18, 2, 4.5]) cube([1, 1, 9], center=true);
    translate([18, 3, 3.5]) cube([1, 1, 7], center=true);
    translate([18, 4, 4.0]) cube([1, 1, 8], center=true);
    translate([18, 5, 4.5]) cube([1, 1, 9], center=true);
    translate([18, 6, 3.5]) cube([1, 1, 7], center=true);
    translate([18, 7, 4.0]) cube([1, 1, 8], center=true);
    translate([18, 8, 4.5]) cube([1, 1, 9], center=true);
    translate([18, 9, 3.5]) cube([1, 1, 7], center=true);
    translate([18, 10, 4.0]) cube([1, 1, 8], center=true);
    translate([18, 11, 4.5]) cube([1, 1, 9], center=true);
    translate([18, 12, 3.5]) cube([1, 1, 7], center=true);
    translate([18, 13, 4.0]) cube([1, 1, 8], center=true);
    translate([18, 14, 4.5]) cube([1, 1, 9], center=true);
    translate([18, 15, 3.5]) cube([1, 1, 7], center=true);
    translate([18, 16, 4.0]) cube([1, 1, 8], center=true);
    translate([18, 17, 4.5]) cube([1, 1, 9], center=true);
    translate([18, 18, 3.5]) cube([1, 1, 7], center=true);
    translate([18, 19, 4.0]) cube([1, 1, 8], center=true);
    translate([19, 0, 3.5]) cube([1, 1, 7], center=true);
    translate([19, 1, 4.0]) cube([1, 1, 8], center=true);
    translate([19, 2, 4.5]) cube([1, 1, 9], center=true);
    translate([19, 3, 3.5]) cube([1, 1, 7], center=true);
    translate([19, 4, 4.0]) cube([1, 1, 8], center=true);
    translate([19, 5, 4.5]) cube([1, 1, 9], center=true);
    translate([19, 6, 3.5]) cube([1, 1, 7], center=true);
    translate([19, 7, 4.0]) cube([1, 1, 8], center=true);
    translate([19, 8, 4.5]) cube([1, 1, 9], center=true);
    translate([19, 9, 3.5]) cube([1, 1, 7], center=true);
    translate([19, 10, 4.0]) cube([1, 1, 8], center=true);
    translate([19, 11, 4.5]) cube([1, 1, 9], center=true);
    translate([19, 12, 3.5]) cube([1, 1, 7], center=true);
    translate([19, 13, 4.0]) cube([1, 1, 8], center=true);
    translate([19, 14, 4.5]) cube([1, 1, 9], center=true);
    translate([19, 15, 3.5]) cube([1, 1, 7], center=true);
    translate([19, 16, 4.0]) cube([1, 1, 8], center=true);
    translate([19, 17, 4.5]) cube([1, 1, 9], center=true);
    translate([19, 18, 3.5]) cube([1, 1, 7], center=true);
    translate([19, 19, 4.0]) cube([1, 1, 8], center=true);
}
